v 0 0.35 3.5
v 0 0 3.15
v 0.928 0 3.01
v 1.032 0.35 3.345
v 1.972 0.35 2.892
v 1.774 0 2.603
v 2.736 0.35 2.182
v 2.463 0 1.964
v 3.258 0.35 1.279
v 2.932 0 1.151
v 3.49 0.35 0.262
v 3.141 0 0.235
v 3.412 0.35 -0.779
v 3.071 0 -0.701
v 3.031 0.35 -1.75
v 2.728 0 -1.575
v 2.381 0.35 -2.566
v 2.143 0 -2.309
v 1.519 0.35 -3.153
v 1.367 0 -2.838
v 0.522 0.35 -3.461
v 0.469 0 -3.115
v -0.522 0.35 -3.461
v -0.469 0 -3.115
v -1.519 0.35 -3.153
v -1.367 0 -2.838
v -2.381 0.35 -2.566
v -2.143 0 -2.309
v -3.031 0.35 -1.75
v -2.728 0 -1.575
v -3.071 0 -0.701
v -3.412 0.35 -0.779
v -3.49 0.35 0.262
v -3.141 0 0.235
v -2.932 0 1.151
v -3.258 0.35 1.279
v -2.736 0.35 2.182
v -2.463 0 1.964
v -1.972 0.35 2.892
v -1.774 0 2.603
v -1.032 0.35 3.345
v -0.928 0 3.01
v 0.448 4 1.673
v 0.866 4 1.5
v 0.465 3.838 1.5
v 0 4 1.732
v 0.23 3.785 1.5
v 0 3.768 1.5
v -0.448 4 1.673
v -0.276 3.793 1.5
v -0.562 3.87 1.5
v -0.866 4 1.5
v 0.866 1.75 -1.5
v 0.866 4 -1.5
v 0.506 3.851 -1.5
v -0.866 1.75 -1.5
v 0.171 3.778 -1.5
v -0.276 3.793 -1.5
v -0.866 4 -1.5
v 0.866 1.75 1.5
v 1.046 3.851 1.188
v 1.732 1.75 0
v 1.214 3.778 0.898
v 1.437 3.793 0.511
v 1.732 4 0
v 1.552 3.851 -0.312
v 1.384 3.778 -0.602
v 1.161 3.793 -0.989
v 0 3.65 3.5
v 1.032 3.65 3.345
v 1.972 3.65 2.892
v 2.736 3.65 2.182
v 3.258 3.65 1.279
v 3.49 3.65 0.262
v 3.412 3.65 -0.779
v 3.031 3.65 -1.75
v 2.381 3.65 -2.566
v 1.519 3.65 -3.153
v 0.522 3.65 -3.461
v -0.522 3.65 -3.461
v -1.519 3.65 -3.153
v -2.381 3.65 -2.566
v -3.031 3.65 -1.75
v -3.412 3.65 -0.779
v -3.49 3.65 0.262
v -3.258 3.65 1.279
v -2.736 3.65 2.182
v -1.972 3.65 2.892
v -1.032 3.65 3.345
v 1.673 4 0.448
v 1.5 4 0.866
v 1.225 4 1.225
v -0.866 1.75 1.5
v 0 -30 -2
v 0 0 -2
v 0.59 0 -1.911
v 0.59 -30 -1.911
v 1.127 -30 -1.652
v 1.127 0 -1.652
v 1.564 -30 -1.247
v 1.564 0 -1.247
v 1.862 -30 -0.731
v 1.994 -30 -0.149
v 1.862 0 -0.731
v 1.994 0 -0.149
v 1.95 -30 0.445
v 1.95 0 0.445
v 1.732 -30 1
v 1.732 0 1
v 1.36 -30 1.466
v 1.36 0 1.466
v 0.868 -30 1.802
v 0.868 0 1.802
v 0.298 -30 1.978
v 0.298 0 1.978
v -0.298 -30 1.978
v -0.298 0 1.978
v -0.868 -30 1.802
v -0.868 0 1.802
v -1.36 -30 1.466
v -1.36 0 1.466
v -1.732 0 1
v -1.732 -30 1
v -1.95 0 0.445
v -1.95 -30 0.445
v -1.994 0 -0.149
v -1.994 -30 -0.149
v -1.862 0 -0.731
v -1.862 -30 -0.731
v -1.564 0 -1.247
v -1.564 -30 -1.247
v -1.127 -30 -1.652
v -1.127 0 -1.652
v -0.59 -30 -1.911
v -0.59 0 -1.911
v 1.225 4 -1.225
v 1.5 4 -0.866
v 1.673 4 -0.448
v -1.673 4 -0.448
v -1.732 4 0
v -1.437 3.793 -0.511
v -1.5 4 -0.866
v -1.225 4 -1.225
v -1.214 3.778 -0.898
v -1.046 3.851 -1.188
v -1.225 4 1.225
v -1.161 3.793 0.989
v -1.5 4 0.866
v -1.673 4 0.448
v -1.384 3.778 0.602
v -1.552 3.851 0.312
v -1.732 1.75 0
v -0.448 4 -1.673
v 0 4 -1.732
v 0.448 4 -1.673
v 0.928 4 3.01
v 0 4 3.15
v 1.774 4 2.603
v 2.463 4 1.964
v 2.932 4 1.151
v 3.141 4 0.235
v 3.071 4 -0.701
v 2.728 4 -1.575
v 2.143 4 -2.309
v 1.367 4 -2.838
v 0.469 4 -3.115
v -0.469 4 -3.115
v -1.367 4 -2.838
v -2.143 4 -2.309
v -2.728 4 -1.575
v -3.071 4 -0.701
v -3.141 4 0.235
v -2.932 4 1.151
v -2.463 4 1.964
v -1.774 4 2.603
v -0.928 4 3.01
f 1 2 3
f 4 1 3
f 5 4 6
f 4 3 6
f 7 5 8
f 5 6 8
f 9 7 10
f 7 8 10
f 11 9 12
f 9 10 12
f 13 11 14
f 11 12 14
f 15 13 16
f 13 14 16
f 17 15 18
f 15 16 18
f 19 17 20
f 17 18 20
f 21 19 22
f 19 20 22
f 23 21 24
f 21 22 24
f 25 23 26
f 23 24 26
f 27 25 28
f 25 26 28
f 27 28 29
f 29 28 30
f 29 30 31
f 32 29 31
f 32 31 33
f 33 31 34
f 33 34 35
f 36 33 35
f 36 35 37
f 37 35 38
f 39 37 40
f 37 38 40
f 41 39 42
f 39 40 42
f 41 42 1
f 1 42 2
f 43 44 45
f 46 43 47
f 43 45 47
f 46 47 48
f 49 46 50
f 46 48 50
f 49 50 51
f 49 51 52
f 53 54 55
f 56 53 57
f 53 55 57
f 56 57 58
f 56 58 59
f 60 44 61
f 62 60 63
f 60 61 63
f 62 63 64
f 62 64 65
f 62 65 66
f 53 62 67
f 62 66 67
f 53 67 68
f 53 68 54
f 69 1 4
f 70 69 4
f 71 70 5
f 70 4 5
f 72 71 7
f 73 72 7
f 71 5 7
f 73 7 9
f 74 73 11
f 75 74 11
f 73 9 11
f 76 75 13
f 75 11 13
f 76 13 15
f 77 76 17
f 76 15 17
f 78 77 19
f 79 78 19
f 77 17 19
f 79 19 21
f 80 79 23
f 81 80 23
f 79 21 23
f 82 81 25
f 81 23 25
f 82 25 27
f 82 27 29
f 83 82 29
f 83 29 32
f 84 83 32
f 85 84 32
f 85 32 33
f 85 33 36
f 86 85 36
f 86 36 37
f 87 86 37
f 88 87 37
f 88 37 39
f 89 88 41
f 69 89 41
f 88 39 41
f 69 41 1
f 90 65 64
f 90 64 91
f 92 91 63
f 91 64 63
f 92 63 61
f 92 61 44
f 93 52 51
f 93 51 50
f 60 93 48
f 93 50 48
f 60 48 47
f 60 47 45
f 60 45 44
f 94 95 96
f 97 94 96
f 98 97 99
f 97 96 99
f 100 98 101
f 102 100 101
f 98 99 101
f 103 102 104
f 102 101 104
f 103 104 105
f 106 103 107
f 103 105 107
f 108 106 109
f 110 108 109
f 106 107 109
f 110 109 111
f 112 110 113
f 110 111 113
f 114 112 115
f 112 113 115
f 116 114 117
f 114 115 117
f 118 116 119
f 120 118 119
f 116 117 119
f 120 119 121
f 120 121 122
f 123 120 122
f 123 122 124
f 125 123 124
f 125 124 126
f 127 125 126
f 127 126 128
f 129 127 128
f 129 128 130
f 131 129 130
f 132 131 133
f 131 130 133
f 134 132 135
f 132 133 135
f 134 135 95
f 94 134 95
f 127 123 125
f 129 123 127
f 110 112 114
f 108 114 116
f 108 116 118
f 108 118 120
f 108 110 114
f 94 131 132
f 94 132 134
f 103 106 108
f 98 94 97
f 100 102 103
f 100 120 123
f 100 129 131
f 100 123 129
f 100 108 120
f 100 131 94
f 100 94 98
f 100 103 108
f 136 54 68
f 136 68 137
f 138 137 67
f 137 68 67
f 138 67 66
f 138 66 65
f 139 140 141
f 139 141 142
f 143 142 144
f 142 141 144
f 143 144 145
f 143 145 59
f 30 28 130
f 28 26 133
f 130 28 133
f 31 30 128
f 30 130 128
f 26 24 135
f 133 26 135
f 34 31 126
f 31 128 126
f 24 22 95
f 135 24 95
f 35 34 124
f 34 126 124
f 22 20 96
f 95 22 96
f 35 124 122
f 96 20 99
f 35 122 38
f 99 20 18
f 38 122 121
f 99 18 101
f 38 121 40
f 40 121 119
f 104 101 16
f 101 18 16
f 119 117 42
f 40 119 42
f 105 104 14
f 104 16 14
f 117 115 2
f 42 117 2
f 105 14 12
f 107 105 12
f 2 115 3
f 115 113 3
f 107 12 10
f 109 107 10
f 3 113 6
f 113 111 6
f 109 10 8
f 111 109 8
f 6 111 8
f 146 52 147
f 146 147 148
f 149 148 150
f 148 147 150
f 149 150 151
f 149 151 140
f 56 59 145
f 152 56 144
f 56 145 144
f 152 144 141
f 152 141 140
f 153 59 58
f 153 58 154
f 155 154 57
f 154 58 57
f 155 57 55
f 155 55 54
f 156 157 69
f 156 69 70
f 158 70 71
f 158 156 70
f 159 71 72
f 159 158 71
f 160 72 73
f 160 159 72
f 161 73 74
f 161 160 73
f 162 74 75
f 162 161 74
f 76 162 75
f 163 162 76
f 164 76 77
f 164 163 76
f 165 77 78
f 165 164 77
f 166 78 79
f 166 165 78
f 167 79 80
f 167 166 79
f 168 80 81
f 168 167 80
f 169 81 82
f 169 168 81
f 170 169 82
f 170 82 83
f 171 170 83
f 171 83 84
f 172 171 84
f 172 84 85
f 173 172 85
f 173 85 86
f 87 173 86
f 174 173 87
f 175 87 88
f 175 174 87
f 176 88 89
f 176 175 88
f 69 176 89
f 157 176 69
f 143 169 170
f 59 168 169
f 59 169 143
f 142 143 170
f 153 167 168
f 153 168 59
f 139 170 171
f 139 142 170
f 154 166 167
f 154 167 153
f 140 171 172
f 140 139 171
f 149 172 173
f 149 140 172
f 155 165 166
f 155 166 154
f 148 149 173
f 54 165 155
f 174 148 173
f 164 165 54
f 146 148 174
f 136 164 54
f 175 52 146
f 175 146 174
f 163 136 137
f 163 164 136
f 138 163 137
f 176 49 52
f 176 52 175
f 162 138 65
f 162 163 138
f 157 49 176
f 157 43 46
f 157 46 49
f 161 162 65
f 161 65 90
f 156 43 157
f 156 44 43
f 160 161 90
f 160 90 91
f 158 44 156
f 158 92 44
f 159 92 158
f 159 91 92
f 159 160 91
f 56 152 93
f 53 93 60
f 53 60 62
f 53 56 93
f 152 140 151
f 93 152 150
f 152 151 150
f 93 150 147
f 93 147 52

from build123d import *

# Parameters (mm, degrees)
SKETCH1_R           = 3.5
BOSS_EXTRUDE1_DEPTH = 4
CUT_EXTRUDE1_DEPTH  = 2.25
CHAMFER1_SIZE       = 0.35
SKETCH_1_R          = 2
EXTRUDE_1_DEPTH     = 30


with BuildPart() as part:
    # Sketch1 → Boss-Extrude1 (new body)
    with BuildSketch(Plane(origin=(0, 0, 0), x_dir=(1, 0, 0), z_dir=(0, 1, 0))):
        with Locations(Location((0, 0, 0), (0, 0, 270))):
            Circle(SKETCH1_R)
    extrude(amount=BOSS_EXTRUDE1_DEPTH)

    # Sketch2 → Cut-Extrude1 (cut)
    with BuildSketch(Plane(origin=(0, 4, 0), x_dir=(1, 0, 0), z_dir=(0, 1, 0))):
        Polygon((0.866025404, 1.5), (-0.866025404, 1.5), (-1.732050808, 0), (-0.866025404, -1.5), (0.866025404, -1.5), (1.732050808, 0), align=None)
    extrude(amount=-CUT_EXTRUDE1_DEPTH, mode=Mode.SUBTRACT)

    # Cut-Extrude2 cone 1 section (through the dimple's axis) → Cut-Extrude2 (revolve, cut)
    with BuildSketch(Plane(origin=(0, 4, 0), x_dir=(0, 0, 1), z_dir=(1, 0, 0))):
        Polygon((0, 0), (1.732050808, 0), (0, 1.732050808), align=None)
    revolve(axis=Axis((0, 4, 0), (0, -1, 0)), mode=Mode.SUBTRACT)

    # Chamfer1
    chamfer1_edges = [part.edges().sort_by_distance(p)[0] for p in [
        (0, 0, -3.5),
        (0, 4, -3.5),
    ]]
    chamfer(chamfer1_edges, length=CHAMFER1_SIZE)

    # 草图1 → 凸台-拉伸1 (add)
    with BuildSketch(Plane(origin=(0, 0, 0), x_dir=(-1, 0, 0), z_dir=(0, -1, 0))):
        with Locations(Location((0, 0, 0), (0, 0, 90))):
            Circle(SKETCH_1_R)
    extrude(amount=EXTRUDE_1_DEPTH)


solid = part.part
